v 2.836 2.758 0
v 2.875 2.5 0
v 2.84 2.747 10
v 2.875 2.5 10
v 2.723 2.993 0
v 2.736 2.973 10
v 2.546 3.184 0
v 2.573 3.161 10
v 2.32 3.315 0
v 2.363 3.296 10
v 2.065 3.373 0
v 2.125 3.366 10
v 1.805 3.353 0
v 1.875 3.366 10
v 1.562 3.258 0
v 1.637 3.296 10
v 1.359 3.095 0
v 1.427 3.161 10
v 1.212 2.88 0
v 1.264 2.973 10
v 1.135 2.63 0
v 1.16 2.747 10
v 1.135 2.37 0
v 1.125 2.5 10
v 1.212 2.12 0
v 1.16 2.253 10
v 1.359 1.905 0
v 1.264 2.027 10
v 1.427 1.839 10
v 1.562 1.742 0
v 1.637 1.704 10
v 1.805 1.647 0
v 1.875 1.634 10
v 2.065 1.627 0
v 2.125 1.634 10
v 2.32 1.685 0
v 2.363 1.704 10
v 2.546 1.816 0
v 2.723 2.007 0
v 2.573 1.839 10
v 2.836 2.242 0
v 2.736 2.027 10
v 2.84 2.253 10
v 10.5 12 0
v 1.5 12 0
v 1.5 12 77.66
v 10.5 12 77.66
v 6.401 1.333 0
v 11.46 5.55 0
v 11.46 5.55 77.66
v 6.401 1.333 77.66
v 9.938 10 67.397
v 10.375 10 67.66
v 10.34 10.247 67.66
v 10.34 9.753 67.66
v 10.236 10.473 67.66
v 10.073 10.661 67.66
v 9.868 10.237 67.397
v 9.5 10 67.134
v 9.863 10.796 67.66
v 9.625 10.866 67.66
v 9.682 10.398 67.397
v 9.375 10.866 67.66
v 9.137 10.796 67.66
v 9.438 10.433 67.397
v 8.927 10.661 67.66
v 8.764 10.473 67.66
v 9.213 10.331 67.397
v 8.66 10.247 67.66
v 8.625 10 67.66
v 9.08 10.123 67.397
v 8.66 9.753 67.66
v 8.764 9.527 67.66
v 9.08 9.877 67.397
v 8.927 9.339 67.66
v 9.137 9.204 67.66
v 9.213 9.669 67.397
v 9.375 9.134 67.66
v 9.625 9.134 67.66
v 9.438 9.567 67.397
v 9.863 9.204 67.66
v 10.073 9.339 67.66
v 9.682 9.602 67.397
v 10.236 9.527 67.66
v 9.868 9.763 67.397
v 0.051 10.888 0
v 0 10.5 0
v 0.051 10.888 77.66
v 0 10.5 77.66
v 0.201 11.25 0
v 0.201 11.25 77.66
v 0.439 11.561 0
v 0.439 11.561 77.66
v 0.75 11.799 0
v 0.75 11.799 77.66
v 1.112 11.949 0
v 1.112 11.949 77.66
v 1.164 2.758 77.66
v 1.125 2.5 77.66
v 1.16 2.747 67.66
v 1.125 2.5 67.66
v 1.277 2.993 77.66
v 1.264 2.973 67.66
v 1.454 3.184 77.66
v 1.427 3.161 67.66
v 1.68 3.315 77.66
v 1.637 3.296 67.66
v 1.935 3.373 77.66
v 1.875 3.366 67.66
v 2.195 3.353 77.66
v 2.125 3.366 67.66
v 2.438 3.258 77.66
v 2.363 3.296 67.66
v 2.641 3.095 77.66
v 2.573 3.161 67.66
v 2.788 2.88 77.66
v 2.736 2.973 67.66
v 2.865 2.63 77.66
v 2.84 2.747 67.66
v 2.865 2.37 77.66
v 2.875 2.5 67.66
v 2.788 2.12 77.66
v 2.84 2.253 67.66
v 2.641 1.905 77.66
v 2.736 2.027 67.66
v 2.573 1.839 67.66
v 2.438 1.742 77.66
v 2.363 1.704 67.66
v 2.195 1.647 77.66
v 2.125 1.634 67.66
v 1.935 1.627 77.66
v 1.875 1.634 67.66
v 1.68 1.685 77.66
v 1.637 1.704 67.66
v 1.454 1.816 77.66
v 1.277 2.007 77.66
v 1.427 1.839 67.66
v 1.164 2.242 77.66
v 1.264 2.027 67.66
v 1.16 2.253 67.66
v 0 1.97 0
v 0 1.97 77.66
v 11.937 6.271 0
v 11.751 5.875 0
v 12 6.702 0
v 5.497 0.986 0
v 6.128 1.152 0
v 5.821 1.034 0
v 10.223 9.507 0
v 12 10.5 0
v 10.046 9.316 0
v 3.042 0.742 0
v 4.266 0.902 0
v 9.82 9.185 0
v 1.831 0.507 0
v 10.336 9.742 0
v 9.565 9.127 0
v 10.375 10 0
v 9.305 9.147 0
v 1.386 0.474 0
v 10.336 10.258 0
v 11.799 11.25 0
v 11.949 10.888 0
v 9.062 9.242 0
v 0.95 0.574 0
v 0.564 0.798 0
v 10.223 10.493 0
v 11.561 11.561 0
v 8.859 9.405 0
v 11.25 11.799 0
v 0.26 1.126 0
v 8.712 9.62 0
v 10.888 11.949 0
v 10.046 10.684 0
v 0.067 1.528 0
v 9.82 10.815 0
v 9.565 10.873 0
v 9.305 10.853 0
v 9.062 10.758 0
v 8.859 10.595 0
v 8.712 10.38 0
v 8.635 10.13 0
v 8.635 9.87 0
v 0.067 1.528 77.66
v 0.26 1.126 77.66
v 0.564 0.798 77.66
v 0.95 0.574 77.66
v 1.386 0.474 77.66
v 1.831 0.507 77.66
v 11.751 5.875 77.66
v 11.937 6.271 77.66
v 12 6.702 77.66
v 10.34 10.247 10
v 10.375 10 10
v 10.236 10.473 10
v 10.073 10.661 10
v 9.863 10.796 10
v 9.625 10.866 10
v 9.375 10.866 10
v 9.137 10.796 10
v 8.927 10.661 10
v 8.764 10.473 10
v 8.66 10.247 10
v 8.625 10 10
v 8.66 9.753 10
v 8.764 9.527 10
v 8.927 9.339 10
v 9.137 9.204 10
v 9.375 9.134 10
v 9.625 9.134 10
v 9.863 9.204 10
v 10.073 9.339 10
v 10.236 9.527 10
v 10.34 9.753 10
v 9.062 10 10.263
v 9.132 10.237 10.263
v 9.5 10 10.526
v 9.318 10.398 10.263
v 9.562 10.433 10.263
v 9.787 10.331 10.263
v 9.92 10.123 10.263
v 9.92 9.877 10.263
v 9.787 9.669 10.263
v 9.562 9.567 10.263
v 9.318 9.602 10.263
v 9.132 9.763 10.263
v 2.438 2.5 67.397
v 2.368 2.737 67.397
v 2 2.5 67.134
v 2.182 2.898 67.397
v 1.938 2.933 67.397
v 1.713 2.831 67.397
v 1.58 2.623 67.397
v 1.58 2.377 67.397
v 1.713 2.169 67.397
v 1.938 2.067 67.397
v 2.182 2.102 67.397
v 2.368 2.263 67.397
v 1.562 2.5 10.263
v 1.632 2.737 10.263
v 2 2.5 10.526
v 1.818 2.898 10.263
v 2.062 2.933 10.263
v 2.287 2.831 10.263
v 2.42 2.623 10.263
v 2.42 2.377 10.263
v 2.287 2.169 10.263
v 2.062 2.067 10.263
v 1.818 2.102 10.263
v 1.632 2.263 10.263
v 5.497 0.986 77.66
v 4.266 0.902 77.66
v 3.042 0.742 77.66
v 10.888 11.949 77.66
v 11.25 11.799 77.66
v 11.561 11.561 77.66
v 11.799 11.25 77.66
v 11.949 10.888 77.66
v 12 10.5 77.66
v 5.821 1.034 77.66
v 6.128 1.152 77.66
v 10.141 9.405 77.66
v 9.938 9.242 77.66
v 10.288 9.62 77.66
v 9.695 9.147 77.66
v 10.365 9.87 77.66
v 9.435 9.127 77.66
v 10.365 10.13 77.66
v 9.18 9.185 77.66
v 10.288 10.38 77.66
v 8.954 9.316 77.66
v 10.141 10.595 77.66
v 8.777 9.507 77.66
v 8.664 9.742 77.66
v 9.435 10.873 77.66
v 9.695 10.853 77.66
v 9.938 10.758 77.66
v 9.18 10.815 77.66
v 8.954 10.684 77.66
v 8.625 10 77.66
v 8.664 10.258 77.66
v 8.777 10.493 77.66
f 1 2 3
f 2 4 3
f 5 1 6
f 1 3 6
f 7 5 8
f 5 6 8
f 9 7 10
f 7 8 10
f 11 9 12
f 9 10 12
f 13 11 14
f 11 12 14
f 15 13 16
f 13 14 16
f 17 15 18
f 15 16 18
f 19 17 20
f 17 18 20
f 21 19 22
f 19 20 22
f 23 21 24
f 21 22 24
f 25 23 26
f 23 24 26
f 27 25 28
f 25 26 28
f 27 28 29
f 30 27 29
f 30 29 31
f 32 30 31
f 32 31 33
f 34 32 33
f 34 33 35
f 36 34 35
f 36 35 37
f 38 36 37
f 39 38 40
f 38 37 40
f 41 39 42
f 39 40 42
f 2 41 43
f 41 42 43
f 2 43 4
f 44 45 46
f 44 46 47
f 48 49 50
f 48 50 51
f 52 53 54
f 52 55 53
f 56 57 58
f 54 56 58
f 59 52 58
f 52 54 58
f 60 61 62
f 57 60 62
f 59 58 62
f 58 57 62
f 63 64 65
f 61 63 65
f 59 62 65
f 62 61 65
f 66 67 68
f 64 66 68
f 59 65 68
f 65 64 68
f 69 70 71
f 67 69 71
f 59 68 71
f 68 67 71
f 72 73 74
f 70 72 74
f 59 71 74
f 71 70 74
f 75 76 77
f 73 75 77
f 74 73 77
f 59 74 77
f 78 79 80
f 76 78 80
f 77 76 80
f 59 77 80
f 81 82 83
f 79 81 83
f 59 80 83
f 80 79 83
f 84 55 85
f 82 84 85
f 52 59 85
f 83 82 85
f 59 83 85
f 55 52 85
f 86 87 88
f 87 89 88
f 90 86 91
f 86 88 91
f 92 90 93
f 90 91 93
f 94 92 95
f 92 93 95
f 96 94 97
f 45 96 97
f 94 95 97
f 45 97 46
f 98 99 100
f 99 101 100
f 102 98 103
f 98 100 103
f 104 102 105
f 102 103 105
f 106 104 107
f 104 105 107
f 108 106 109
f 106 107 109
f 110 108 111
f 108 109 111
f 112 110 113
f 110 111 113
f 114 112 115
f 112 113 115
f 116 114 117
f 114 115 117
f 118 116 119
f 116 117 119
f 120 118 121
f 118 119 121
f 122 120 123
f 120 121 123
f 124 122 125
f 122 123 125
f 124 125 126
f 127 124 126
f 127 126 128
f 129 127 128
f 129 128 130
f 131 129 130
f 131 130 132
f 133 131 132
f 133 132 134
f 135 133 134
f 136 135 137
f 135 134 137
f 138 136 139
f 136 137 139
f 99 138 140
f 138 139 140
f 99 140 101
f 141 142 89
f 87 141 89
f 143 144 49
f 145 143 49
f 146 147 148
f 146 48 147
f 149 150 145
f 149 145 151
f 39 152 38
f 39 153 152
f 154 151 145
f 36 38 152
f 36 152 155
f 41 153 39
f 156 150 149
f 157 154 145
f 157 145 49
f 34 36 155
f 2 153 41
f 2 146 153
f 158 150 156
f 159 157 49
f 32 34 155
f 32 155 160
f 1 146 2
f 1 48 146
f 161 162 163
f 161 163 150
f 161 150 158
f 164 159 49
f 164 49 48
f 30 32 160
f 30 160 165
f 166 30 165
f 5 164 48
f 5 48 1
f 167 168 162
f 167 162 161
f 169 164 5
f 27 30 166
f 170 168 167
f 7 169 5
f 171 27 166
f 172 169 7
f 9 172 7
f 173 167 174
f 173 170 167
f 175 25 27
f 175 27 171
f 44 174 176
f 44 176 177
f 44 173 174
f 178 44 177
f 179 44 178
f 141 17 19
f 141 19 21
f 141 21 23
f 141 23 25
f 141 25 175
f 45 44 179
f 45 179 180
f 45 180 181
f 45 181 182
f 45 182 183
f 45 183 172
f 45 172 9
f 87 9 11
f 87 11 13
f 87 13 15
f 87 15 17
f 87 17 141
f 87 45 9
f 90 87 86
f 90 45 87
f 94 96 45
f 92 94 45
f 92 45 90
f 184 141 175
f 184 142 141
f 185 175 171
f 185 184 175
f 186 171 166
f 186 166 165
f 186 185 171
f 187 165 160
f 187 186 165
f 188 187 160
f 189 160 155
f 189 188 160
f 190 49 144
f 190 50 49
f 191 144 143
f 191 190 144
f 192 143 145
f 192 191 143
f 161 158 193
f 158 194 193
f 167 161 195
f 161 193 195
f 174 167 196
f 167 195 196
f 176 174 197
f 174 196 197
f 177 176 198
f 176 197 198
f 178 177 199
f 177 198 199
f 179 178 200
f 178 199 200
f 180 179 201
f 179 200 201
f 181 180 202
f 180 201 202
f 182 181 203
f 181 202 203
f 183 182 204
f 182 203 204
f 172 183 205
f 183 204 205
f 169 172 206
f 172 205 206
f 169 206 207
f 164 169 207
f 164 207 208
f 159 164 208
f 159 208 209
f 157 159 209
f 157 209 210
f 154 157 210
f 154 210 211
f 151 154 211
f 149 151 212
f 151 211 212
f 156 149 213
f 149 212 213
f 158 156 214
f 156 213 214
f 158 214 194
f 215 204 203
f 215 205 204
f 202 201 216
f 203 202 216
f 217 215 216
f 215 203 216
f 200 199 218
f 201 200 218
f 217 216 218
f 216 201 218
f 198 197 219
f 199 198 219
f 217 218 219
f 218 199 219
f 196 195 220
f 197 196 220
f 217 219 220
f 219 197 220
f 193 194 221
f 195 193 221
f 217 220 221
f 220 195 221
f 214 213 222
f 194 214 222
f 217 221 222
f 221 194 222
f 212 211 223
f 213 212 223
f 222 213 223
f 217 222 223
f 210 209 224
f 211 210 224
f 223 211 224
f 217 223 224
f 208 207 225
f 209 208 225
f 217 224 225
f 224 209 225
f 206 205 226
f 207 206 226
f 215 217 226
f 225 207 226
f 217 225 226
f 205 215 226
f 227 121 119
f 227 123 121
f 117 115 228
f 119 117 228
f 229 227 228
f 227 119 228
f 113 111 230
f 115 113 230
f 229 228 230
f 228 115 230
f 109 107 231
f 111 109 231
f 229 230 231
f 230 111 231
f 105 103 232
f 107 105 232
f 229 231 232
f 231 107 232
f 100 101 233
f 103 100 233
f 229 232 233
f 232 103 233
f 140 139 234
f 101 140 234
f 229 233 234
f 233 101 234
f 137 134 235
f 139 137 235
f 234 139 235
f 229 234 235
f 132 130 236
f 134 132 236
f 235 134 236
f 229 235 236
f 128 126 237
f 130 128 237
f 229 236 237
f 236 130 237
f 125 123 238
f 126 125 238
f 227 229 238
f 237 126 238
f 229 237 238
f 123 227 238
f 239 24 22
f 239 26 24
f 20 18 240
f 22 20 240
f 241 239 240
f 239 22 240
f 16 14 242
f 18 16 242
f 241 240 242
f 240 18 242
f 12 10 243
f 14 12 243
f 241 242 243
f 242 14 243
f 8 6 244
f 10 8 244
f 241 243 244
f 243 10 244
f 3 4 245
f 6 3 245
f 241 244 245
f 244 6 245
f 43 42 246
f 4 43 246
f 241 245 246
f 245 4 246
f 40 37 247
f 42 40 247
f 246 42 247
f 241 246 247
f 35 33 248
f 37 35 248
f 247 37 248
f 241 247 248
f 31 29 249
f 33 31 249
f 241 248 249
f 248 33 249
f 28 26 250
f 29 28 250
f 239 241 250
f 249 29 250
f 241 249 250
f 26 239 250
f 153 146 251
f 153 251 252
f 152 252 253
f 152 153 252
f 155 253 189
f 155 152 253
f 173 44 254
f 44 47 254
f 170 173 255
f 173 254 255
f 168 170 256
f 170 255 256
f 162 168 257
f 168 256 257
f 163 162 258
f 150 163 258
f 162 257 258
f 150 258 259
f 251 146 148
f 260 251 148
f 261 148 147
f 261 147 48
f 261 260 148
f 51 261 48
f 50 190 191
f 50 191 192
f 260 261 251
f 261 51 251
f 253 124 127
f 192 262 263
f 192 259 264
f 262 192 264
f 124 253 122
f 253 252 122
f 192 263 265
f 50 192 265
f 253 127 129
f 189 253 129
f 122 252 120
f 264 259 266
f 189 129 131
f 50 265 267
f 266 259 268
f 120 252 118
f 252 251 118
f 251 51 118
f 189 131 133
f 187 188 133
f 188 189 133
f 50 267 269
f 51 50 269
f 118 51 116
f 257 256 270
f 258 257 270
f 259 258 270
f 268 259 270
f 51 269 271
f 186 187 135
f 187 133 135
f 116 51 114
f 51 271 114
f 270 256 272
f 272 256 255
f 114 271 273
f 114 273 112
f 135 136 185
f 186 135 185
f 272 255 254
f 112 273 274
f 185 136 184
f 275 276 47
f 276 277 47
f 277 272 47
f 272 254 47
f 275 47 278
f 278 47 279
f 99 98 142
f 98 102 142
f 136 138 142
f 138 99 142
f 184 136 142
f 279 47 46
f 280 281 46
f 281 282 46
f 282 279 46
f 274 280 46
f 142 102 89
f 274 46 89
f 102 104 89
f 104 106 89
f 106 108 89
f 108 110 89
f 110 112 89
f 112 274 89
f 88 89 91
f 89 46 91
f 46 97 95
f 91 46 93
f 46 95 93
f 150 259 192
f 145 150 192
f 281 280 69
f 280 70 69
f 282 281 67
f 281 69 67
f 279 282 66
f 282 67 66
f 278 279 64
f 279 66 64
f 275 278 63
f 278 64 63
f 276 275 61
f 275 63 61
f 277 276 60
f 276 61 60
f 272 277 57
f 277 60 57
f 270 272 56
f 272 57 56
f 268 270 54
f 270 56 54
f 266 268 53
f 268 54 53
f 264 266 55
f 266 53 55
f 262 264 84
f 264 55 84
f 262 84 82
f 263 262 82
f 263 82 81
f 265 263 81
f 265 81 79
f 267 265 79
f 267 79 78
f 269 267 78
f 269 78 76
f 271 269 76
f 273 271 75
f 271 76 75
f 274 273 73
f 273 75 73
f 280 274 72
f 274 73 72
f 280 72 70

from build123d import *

# Parameters (mm, degrees)
BOSS_EXTRUDE1_DEPTH                    = 77.66
M2_2X0_45_TAPPED_HOLE1_D               = 1.75
M2_2X0_45_TAPPED_HOLE1_DEPTH           = 10
M2_2X0_45_TAPPED_HOLE1_TIP             = 0.525753042
M2_2X0_45_TAPPED_HOLE1_ON_FACE_2_D     = 1.75
M2_2X0_45_TAPPED_HOLE1_ON_FACE_2_DEPTH = 10
M2_2X0_45_TAPPED_HOLE1_ON_FACE_2_TIP   = 0.525753042
FILLET1_R                              = 1.5


with BuildPart() as part:
    # Sketch1 → Boss-Extrude1 (new body)
    with BuildSketch(Plane.XY):
        with BuildLine():
            Line((0, 0), (0, 12))
            Line((0, 12), (12, 12))
            Line((12, 12), (12, 6))
            Line((12, 6), (6, 0.998499343))
            ThreePointArc((6, 0.998499343), (2.961819318, 0.728678054), (0, 0))
        make_face()
    extrude(amount=BOSS_EXTRUDE1_DEPTH)

    # M2.2x0.45 Tapped Hole1
    with Locations(Plane(origin=(2, 2.5, 77.66), x_dir=(1, 0, 0), z_dir=(0, 0, 1))):
        with Locations((0, 0), (7.5, 7.5)):
            Hole(M2_2X0_45_TAPPED_HOLE1_D / 2, depth=M2_2X0_45_TAPPED_HOLE1_DEPTH)
            with Locations((0, 0, -(M2_2X0_45_TAPPED_HOLE1_DEPTH + M2_2X0_45_TAPPED_HOLE1_TIP / 2))):  # 118° drill point
                Cone(0, M2_2X0_45_TAPPED_HOLE1_D / 2, M2_2X0_45_TAPPED_HOLE1_TIP, mode=Mode.SUBTRACT)

    # M2.2x0.45 Tapped Hole1 on face 2
    with Locations(Plane(origin=(2, 2.5, 0), x_dir=(-1, 0, 0), z_dir=(0, 0, -1))):
        with Locations((0, 0), (-7.5, 7.5)):
            Hole(M2_2X0_45_TAPPED_HOLE1_ON_FACE_2_D / 2, depth=M2_2X0_45_TAPPED_HOLE1_ON_FACE_2_DEPTH)
            with Locations((0, 0, -(M2_2X0_45_TAPPED_HOLE1_ON_FACE_2_DEPTH + M2_2X0_45_TAPPED_HOLE1_ON_FACE_2_TIP / 2))):  # 118° drill point
                Cone(0, M2_2X0_45_TAPPED_HOLE1_ON_FACE_2_D / 2, M2_2X0_45_TAPPED_HOLE1_ON_FACE_2_TIP, mode=Mode.SUBTRACT)

    # Fillet1
    fillet1_edges = [part.edges().sort_by_distance(p)[0] for p in [
        (0, 0, 38.83),
        (0, 12, 38.83),
        (12, 12, 38.83),
        (12, 6, 38.83),
        (6, 0.998499343, 38.83),
    ]]
    fillet(fillet1_edges, radius=FILLET1_R)


solid = part.part
